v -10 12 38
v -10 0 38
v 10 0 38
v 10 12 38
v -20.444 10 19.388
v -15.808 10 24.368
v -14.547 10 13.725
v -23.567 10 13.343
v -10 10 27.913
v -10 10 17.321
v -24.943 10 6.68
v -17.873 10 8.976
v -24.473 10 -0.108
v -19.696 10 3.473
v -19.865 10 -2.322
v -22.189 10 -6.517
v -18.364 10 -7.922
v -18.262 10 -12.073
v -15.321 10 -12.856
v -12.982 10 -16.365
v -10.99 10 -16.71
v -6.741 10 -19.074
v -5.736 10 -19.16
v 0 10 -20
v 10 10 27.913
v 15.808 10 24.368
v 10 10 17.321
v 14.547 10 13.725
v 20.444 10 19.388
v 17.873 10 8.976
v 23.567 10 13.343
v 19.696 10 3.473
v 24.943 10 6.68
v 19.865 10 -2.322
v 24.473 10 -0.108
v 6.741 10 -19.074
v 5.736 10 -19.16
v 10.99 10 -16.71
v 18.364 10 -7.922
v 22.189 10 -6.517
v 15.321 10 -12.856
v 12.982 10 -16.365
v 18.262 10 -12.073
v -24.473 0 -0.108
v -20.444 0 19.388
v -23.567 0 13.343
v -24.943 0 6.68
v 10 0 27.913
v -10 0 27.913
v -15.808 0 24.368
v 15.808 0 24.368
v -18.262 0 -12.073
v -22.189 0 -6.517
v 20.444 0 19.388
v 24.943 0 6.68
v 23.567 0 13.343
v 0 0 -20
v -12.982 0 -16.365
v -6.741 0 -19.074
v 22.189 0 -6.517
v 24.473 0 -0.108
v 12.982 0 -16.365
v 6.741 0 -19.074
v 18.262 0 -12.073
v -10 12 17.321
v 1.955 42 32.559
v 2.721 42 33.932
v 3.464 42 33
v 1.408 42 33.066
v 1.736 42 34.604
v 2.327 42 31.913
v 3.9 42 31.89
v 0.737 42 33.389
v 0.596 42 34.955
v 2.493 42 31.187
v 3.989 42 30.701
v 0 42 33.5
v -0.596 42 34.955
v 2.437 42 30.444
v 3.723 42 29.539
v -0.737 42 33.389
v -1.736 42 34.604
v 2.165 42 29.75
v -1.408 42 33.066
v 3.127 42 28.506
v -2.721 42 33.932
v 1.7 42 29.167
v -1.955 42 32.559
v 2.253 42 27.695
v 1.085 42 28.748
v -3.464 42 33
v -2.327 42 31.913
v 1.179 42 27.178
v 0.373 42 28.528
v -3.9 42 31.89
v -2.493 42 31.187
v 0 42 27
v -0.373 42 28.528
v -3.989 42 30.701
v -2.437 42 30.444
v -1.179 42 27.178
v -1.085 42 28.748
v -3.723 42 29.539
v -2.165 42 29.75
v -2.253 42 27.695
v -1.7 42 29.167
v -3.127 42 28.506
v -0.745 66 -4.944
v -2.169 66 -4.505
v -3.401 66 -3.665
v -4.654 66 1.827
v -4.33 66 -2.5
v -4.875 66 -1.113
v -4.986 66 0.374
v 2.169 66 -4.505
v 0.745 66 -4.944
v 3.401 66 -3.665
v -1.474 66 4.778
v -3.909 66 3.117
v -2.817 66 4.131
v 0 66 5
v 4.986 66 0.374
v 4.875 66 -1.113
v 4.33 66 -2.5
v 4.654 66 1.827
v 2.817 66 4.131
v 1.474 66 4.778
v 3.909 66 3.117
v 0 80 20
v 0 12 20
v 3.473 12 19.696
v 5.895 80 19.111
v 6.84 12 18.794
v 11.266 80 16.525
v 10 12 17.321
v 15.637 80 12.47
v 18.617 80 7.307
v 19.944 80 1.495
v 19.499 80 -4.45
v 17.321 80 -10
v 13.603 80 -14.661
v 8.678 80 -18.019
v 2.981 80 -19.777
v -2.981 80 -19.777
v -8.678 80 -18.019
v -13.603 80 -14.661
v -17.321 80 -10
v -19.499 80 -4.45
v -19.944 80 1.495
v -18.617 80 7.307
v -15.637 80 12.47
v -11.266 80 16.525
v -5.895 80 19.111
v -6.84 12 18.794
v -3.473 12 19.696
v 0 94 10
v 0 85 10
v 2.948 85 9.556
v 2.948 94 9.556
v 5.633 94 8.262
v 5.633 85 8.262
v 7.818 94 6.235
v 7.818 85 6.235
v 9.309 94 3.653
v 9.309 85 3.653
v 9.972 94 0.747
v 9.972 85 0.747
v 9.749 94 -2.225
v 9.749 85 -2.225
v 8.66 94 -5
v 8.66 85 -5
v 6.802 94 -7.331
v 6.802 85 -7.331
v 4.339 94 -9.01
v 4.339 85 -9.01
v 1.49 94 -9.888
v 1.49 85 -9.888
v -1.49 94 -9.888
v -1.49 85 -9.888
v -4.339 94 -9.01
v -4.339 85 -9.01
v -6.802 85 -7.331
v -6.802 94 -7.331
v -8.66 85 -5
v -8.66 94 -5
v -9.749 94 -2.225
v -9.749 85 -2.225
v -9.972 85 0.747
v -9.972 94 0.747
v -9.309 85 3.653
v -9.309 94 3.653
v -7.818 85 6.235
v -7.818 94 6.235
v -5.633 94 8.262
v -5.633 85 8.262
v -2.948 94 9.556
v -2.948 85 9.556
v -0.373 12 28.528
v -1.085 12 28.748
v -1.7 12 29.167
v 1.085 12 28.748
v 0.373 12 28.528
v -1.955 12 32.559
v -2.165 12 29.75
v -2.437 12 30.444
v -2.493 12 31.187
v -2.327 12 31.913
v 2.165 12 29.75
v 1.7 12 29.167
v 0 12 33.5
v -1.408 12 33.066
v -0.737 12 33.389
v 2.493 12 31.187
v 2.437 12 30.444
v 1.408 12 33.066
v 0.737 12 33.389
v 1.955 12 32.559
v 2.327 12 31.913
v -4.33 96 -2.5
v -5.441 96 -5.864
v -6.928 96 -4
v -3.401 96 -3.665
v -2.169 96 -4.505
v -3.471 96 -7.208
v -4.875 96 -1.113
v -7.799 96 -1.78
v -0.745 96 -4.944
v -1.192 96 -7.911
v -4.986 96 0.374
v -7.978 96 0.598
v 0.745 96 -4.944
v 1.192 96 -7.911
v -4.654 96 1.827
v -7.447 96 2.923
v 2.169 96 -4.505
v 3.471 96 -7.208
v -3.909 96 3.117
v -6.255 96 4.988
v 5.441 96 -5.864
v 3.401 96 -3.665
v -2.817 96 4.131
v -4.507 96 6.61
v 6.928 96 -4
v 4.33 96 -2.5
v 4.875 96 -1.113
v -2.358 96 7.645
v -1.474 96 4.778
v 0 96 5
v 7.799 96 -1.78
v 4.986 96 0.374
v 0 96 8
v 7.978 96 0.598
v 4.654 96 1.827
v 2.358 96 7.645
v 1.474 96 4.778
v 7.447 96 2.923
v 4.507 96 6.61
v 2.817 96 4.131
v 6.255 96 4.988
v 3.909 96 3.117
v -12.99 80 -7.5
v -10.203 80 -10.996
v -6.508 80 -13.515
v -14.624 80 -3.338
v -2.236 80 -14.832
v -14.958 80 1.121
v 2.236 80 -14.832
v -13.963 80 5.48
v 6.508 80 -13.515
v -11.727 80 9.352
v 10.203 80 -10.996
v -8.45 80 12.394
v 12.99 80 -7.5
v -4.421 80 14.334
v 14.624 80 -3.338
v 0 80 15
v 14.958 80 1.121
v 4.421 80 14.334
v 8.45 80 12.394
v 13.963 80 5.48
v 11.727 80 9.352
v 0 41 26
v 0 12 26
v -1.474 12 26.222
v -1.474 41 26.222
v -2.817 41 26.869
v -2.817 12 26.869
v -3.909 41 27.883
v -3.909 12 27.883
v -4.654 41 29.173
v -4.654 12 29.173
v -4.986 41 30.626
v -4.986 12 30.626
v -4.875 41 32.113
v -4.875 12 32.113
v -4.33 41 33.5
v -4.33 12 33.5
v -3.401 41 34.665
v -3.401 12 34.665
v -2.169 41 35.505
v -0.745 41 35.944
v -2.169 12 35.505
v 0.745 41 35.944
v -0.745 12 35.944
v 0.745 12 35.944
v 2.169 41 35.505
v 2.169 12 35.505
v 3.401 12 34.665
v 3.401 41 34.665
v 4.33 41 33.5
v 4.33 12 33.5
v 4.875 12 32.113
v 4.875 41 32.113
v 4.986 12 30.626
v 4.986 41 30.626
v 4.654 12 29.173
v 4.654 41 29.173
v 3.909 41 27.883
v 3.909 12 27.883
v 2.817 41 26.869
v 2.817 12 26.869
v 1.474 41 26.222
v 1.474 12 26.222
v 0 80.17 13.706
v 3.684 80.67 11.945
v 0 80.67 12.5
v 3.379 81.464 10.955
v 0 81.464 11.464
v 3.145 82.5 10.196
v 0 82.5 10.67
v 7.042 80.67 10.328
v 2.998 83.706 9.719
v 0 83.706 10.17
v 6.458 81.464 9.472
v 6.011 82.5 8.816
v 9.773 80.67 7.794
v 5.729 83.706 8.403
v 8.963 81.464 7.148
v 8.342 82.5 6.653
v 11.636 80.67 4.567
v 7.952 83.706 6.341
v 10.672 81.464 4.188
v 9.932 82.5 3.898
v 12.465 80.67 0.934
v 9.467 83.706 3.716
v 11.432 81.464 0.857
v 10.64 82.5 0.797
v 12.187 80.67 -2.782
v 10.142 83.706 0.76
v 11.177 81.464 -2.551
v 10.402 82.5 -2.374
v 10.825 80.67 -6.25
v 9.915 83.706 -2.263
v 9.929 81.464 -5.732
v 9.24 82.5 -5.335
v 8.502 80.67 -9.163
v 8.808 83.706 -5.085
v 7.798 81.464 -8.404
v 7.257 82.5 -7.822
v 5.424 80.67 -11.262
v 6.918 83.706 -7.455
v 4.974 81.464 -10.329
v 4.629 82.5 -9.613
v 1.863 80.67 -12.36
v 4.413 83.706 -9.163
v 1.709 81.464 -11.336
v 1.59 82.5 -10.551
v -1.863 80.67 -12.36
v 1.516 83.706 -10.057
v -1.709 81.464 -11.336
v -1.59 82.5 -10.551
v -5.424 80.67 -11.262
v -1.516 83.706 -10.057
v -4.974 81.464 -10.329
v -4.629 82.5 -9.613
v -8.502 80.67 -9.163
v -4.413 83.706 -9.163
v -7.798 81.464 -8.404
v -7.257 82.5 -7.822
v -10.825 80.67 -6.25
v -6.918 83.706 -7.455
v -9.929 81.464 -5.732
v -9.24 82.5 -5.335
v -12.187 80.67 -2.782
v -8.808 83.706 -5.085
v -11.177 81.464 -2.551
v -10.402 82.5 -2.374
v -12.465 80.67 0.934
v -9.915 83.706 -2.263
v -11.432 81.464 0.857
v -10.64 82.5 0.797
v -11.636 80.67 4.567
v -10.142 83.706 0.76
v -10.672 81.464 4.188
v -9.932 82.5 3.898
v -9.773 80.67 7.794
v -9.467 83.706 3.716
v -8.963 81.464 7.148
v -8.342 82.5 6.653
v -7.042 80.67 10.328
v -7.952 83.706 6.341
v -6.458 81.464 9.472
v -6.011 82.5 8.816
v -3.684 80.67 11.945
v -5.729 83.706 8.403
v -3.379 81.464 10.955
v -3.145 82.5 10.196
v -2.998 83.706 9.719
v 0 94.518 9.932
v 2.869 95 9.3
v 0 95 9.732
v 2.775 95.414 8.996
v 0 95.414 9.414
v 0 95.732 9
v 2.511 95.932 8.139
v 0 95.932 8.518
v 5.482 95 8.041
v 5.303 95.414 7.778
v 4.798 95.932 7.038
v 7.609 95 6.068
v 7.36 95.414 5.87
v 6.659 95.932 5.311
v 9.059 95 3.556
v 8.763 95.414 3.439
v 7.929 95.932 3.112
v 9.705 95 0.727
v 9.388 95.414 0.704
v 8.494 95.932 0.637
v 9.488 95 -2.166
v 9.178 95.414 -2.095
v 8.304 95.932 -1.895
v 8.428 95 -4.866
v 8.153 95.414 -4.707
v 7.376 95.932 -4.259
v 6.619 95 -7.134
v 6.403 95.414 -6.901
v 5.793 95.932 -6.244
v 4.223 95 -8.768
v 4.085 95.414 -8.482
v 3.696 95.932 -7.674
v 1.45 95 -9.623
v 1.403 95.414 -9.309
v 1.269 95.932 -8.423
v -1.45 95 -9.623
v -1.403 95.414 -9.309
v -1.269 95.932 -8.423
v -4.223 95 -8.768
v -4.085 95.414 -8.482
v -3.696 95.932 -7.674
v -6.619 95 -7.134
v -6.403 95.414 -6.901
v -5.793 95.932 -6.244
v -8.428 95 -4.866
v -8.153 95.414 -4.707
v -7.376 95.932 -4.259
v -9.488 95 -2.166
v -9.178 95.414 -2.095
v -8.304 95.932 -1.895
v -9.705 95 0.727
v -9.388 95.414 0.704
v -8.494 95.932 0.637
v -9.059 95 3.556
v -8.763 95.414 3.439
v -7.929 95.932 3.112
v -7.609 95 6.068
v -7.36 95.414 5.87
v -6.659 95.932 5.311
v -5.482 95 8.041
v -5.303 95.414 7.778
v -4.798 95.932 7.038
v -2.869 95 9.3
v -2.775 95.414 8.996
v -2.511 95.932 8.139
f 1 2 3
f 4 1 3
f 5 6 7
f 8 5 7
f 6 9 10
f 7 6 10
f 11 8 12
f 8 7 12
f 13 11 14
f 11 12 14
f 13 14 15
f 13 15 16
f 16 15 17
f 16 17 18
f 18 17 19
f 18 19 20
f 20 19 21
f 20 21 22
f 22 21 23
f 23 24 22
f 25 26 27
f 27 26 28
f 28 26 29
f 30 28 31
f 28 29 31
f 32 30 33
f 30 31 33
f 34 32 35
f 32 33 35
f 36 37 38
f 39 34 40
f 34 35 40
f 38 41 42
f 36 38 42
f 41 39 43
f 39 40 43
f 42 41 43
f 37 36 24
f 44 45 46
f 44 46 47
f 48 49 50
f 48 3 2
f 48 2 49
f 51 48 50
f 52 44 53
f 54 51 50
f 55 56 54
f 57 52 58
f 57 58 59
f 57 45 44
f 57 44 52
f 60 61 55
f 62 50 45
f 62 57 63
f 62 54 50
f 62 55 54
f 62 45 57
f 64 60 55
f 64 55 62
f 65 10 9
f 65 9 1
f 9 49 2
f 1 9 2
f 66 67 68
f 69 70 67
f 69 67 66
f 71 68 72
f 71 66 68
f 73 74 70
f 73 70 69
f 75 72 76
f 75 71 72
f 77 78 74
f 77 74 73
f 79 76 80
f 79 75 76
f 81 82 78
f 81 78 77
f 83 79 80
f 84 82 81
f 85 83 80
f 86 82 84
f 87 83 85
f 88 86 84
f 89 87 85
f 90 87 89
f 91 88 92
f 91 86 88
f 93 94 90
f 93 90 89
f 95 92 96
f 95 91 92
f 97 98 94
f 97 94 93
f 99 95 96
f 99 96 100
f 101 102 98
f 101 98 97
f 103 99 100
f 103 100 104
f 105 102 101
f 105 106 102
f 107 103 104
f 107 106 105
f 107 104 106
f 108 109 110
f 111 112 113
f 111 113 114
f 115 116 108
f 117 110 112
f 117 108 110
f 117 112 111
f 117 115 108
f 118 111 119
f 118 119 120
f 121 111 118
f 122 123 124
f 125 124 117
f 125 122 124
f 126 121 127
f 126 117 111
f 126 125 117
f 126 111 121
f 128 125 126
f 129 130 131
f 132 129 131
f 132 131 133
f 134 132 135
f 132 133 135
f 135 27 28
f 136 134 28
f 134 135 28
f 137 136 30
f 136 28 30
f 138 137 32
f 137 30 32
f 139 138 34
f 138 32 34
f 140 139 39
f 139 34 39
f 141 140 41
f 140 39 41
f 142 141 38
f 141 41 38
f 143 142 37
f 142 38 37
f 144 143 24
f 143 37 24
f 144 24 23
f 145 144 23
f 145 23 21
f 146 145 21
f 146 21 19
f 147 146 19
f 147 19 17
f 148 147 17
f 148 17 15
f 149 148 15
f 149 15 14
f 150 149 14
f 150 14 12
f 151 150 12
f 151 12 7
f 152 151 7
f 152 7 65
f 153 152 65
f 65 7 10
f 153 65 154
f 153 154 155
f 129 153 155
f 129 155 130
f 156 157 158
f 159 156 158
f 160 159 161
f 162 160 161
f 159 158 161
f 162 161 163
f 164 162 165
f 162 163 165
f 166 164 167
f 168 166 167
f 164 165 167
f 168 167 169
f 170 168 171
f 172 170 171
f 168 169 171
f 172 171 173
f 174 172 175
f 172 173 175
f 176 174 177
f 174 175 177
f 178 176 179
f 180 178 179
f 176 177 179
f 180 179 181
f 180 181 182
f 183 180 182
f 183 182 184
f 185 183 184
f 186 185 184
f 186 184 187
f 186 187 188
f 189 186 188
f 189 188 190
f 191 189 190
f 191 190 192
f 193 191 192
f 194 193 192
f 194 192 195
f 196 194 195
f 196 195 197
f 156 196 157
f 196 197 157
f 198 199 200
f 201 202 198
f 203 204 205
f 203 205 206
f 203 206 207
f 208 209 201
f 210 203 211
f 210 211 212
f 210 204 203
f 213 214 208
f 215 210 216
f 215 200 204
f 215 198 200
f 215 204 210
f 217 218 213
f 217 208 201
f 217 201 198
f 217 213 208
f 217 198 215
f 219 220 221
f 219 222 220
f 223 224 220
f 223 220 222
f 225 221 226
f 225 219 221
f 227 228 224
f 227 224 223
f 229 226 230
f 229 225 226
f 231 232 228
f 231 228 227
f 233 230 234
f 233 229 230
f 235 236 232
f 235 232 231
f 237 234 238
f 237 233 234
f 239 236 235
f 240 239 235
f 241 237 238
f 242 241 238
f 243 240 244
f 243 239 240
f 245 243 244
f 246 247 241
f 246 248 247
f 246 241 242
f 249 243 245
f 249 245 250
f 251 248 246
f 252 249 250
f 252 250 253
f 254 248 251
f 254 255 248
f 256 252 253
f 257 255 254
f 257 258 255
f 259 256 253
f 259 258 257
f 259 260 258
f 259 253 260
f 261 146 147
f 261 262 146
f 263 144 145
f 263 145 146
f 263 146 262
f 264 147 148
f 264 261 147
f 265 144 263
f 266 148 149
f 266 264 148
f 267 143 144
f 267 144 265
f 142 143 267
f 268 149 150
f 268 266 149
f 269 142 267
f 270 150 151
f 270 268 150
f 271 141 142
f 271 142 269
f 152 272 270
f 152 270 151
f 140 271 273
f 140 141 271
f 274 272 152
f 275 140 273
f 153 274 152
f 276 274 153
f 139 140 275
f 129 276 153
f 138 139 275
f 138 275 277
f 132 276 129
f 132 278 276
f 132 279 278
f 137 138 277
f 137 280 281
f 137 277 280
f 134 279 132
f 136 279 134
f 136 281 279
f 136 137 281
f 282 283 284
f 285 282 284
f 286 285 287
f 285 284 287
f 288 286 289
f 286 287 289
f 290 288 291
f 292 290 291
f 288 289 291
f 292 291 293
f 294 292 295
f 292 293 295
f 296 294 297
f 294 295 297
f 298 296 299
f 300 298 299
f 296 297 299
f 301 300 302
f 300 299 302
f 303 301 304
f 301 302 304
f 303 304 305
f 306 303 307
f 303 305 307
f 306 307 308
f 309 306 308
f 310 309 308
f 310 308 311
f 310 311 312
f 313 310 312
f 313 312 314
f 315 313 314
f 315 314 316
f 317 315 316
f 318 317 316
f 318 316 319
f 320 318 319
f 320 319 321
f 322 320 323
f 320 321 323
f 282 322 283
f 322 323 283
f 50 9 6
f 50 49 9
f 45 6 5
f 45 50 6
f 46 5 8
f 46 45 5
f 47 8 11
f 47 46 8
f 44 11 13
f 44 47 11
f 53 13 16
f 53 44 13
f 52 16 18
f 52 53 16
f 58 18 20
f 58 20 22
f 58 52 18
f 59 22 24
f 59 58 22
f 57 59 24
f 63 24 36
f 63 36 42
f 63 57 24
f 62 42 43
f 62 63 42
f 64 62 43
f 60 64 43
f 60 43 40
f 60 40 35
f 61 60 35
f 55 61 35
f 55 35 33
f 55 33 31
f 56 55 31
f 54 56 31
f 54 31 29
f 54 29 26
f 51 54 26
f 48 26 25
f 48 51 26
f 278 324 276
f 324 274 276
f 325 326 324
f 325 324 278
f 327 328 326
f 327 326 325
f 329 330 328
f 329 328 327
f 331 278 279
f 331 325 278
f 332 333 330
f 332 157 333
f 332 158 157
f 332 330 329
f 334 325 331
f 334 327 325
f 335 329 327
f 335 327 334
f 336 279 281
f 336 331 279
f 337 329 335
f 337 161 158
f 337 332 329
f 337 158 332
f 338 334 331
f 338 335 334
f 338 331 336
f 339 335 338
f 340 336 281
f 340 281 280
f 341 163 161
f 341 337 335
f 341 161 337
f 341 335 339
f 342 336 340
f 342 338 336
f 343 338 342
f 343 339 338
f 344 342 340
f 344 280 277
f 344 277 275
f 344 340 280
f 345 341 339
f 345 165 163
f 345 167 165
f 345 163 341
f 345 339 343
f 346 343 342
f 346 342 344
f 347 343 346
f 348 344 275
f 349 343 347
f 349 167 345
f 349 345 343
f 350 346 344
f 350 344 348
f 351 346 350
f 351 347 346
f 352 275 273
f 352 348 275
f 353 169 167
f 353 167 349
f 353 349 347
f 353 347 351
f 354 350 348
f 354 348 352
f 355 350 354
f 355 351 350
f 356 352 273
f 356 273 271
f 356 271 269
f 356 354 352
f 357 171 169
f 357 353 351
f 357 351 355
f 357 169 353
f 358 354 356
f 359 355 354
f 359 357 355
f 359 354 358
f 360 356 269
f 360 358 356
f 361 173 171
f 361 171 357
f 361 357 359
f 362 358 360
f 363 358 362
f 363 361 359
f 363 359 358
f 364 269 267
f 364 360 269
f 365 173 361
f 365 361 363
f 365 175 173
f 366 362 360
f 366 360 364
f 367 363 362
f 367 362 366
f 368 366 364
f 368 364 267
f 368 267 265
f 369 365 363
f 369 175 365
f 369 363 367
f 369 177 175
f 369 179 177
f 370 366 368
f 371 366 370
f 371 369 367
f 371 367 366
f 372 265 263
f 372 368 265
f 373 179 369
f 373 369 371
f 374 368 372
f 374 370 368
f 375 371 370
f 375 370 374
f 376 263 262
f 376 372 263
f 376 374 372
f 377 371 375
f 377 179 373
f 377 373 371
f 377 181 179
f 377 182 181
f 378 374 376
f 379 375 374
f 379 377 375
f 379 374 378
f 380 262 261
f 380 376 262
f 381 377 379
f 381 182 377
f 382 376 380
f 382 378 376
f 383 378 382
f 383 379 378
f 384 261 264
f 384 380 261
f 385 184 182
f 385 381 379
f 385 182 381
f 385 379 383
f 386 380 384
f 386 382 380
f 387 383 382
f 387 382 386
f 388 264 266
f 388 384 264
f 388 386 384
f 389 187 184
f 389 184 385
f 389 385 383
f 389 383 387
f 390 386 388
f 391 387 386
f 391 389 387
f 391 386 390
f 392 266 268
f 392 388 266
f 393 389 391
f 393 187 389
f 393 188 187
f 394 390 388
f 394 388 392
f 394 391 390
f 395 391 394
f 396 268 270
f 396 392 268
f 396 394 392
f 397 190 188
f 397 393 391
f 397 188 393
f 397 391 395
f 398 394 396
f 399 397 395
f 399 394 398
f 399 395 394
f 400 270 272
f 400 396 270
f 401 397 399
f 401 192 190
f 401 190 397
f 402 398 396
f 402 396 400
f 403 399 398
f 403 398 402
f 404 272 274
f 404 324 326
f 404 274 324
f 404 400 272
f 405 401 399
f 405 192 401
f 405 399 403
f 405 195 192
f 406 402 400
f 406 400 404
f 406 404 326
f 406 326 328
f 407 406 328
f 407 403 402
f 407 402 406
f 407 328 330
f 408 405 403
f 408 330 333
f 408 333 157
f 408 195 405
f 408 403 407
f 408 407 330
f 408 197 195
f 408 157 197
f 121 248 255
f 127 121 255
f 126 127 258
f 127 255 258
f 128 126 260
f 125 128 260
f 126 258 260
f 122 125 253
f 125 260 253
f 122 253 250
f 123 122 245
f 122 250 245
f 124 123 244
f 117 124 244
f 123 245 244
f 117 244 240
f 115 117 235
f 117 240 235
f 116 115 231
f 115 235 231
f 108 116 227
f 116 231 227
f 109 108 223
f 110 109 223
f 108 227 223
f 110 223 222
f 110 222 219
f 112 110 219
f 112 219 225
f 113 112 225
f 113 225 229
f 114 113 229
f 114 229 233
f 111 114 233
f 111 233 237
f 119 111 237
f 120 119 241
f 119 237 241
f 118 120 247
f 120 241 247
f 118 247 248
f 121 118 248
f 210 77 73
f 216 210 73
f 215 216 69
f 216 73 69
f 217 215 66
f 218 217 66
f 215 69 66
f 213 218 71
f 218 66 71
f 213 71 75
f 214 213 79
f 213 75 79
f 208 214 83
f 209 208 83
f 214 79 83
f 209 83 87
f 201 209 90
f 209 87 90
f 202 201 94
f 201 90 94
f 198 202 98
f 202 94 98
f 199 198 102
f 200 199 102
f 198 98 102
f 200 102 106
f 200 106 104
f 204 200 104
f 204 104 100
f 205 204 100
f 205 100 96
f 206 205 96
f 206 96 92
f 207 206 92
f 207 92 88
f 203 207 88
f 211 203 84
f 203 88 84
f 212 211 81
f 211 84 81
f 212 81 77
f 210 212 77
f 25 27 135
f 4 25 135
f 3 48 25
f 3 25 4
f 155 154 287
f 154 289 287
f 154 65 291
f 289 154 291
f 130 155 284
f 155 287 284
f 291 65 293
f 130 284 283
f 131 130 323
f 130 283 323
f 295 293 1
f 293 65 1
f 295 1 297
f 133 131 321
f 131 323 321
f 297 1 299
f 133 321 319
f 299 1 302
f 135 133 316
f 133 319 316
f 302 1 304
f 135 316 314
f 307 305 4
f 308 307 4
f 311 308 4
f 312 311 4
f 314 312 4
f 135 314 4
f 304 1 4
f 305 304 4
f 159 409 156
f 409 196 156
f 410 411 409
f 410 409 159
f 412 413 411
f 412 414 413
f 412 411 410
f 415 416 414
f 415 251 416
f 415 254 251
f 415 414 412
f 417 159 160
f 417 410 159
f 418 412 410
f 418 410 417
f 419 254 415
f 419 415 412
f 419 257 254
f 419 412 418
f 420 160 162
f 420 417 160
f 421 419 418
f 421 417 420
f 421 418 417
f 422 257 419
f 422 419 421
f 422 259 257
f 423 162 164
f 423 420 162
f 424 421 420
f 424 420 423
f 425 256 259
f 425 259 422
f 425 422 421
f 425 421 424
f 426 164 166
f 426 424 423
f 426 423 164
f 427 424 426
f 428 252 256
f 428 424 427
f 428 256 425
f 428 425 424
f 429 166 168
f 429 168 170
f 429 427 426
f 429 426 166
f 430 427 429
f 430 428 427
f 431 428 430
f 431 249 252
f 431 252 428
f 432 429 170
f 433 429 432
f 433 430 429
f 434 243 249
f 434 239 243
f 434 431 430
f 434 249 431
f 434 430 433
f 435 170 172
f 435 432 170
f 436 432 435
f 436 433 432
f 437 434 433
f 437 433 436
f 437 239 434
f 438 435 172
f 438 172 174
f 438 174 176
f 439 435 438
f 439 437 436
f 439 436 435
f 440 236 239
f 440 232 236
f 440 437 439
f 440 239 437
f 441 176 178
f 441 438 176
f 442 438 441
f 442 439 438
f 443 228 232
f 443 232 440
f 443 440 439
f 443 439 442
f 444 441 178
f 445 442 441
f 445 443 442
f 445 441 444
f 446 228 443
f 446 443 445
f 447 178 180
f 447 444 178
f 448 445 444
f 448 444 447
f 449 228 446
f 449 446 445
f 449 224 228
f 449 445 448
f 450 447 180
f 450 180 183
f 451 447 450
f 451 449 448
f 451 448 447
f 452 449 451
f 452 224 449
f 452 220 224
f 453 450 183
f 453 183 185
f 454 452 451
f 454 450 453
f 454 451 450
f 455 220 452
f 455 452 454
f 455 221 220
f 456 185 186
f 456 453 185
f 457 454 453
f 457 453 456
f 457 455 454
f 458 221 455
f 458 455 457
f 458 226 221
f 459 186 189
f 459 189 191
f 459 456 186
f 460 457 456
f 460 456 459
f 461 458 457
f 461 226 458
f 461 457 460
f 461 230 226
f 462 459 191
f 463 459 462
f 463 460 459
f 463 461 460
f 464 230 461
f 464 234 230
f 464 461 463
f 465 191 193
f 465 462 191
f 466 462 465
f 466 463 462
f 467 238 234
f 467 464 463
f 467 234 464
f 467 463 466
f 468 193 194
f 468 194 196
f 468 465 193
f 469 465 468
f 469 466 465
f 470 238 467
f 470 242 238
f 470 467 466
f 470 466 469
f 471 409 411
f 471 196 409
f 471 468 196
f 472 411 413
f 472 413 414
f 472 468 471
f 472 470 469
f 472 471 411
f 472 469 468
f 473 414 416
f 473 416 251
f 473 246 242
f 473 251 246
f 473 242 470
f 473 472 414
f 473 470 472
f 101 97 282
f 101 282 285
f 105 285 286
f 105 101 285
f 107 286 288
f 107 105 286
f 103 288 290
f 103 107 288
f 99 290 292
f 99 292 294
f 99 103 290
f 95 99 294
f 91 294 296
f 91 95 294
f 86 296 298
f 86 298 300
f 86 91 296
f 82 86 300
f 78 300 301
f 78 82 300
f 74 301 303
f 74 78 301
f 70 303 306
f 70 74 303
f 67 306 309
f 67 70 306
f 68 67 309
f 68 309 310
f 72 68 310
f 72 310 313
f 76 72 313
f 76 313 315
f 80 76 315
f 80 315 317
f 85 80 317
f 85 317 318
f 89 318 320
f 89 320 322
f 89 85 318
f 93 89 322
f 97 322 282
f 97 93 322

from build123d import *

# Parameters (mm, degrees)
SKETCH_1_R          = 20
EXTRUDE_1_DEPTH     = 80
SKETCH_2_R          = 10
EXTRUDE_2_DEPTH     = 16
SKETCH_3_R          = 25
EXTRUDE_3_DEPTH     = 10
SKETCH_4_W          = 20
SKETCH_4_H          = 38
EXTRUDE_4_DEPTH     = 12
SKETCH_5_R          = 5
EXTRUDE_5_DEPTH     = 30
FILLET_1_R          = 5
FILLET_2_R          = 2
SKETCH_6_R          = 5
CUT_EXTRUDE_1_DEPTH = 30
SKETCH_7_R          = 2.5
CUT_EXTRUDE_2_DEPTH = 30
CHAMFER_1_SIZE      = 1


with BuildPart() as part:
    # Эскиз1 → Бобышка-Вытянуть1 (new body)
    with BuildSketch(Plane(origin=(0, 0, 0), x_dir=(1, 0, 0), z_dir=(0, 1, 0))):
        with Locations(Location((0, 0, 0), (0, 0, 270))):
            Circle(SKETCH_1_R)
    extrude(amount=EXTRUDE_1_DEPTH)

    # Эскиз2 → Бобышка-Вытянуть2 (add)
    with BuildSketch(Plane(origin=(0, 80, 0), x_dir=(1, 0, 0), z_dir=(0, 1, 0))):
        with Locations(Location((0, 0, 0), (0, 0, 270))):
            Circle(SKETCH_2_R)
    extrude(amount=EXTRUDE_2_DEPTH)

    # Эскиз3 → Бобышка-Вытянуть3 (add)
    with BuildSketch(Plane.XZ):
        with Locations(Location((0, 5, 0), (0, 0, 270))):
            Circle(SKETCH_3_R)
    extrude(amount=-EXTRUDE_3_DEPTH)

    # Эскиз4 → Бобышка-Вытянуть4 (add)
    with BuildSketch(Plane.XZ):
        with Locations((0, 19)):
            Rectangle(SKETCH_4_W, SKETCH_4_H)
    extrude(amount=-EXTRUDE_4_DEPTH)

    # Эскиз5 → Бобышка-Вытянуть5 (add)
    with BuildSketch(Plane(origin=(0, 12, 0), x_dir=(1, 0, 0), z_dir=(0, 1, 0))):
        with Locations(Location((0, -31, 0), (0, 0, 90))):
            Circle(SKETCH_5_R)
    extrude(amount=EXTRUDE_5_DEPTH)

    # Скругление1
    fillet_1_edges = [part.edges().sort_by_distance(p)[0] for p in [
        (0, 80, -10),
    ]]
    fillet(fillet_1_edges, radius=FILLET_1_R)

    # Скругление2
    fillet_2_edges = [part.edges().sort_by_distance(p)[0] for p in [
        (0, 96, -10),
    ]]
    fillet(fillet_2_edges, radius=FILLET_2_R)

    # Эскиз6 → Вырез-Вытянуть1 (cut)
    with BuildSketch(Plane(origin=(0, 96, 0), x_dir=(1, 0, 0), z_dir=(0, 1, 0))):
        with Locations(Location((0, 0, 0), (0, 0, 270))):
            Circle(SKETCH_6_R)
    extrude(amount=-CUT_EXTRUDE_1_DEPTH, mode=Mode.SUBTRACT)

    # Эскиз7 → Вырез-Вытянуть2 (cut)
    with BuildSketch(Plane(origin=(0, 42, 0), x_dir=(1, 0, 0), z_dir=(0, 1, 0))):
        with Locations(Location((0, -31, 0), (0, 0, 270))):
            Circle(SKETCH_7_R)
    extrude(amount=-CUT_EXTRUDE_2_DEPTH, mode=Mode.SUBTRACT)

    # Фаска1
    chamfer_1_edges = [part.edges().sort_by_distance(p)[0] for p in [
        (0, 42, 36),
    ]]
    chamfer(chamfer_1_edges, length=CHAMFER_1_SIZE)


solid = part.part
